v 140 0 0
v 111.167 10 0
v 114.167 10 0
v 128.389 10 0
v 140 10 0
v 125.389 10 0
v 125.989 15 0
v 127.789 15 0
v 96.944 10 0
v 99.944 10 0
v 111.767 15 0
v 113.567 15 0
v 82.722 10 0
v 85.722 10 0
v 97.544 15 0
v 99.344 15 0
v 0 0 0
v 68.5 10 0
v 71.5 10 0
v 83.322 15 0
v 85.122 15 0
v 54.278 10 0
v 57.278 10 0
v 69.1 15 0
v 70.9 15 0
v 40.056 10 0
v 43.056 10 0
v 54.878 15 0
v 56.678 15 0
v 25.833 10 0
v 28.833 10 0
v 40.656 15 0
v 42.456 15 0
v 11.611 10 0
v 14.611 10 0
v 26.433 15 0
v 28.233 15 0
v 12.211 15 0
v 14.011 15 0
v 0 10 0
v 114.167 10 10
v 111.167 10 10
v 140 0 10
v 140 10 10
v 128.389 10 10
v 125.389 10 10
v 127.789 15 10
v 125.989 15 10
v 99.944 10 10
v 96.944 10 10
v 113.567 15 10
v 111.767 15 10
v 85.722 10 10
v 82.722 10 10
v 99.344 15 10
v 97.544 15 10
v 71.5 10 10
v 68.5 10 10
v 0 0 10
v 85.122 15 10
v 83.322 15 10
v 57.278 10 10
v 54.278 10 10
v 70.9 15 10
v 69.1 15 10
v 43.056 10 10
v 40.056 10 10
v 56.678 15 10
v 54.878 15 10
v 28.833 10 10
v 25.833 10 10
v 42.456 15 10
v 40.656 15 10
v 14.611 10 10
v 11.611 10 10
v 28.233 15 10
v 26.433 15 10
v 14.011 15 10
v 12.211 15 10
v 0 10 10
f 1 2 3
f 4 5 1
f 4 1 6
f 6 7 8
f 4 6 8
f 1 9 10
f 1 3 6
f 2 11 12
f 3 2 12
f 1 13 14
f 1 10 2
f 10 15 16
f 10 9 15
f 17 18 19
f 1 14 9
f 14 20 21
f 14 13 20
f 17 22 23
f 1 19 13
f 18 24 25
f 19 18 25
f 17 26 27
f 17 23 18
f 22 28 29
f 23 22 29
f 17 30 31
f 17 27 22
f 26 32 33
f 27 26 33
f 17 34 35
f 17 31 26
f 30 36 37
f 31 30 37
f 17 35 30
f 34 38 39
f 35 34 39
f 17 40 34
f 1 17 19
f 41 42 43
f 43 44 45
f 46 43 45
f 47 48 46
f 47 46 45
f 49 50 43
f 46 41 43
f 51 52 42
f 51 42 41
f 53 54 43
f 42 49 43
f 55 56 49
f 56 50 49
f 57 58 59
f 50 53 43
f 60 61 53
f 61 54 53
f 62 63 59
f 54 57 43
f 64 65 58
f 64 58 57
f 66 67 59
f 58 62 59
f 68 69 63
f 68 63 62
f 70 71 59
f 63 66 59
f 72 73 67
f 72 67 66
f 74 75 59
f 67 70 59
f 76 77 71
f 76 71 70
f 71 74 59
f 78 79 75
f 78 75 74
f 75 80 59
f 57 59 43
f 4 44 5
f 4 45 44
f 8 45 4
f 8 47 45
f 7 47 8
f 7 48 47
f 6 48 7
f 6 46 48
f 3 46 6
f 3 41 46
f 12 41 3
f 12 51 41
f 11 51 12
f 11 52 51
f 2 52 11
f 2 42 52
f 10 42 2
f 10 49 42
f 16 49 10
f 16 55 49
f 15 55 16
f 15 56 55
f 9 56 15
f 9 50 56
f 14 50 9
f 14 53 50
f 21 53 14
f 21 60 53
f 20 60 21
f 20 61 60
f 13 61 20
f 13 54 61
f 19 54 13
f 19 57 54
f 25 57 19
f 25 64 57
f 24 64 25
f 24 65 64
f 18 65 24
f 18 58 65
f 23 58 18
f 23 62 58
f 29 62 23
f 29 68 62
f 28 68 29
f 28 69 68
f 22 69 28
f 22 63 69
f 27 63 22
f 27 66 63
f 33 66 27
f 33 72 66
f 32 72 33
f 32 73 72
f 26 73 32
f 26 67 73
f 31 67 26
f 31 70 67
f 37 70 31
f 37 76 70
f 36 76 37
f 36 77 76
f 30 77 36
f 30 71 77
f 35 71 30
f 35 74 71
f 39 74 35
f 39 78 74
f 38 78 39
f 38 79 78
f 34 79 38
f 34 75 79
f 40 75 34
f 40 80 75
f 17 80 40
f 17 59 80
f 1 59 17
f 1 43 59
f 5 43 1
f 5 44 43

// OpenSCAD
$fn = 32;

// ----------------------------------------------------------------------
// Gear rack: 9 teeth on a 140 mm bar, pitch 14.22 mm
// ----------------------------------------------------------------------

// --- parameters (mm) ---
profile_height = 10;      // extrusion height
profile_points = 40;      // points of the closed outline

profile = [[0, 0], [140, 0], [140, 10], [128.389, 10], [127.789, 15], [125.989, 15], [125.389, 10], [114.167, 10], [113.567, 15], [111.767, 15], [111.167, 10], [99.944, 10], [99.344, 15], [97.544, 15], [96.944, 10], [85.722, 10], [85.122, 15], [83.322, 15], [82.722, 10], [71.5, 10], [70.9, 15], [69.1, 15], [68.5, 10], [57.278, 10], [56.678, 15], [54.878, 15], [54.278, 10], [43.056, 10], [42.456, 15], [40.656, 15], [40.056, 10], [28.833, 10], [28.233, 15], [26.433, 15], [25.833, 10], [14.611, 10], [14.011, 15], [12.211, 15], [11.611, 10], [0, 10]];  // single closed polygon, 40 points, counter clockwise

// --- the one profile operation ---
linear_extrude(height = profile_height) polygon(points = profile);
